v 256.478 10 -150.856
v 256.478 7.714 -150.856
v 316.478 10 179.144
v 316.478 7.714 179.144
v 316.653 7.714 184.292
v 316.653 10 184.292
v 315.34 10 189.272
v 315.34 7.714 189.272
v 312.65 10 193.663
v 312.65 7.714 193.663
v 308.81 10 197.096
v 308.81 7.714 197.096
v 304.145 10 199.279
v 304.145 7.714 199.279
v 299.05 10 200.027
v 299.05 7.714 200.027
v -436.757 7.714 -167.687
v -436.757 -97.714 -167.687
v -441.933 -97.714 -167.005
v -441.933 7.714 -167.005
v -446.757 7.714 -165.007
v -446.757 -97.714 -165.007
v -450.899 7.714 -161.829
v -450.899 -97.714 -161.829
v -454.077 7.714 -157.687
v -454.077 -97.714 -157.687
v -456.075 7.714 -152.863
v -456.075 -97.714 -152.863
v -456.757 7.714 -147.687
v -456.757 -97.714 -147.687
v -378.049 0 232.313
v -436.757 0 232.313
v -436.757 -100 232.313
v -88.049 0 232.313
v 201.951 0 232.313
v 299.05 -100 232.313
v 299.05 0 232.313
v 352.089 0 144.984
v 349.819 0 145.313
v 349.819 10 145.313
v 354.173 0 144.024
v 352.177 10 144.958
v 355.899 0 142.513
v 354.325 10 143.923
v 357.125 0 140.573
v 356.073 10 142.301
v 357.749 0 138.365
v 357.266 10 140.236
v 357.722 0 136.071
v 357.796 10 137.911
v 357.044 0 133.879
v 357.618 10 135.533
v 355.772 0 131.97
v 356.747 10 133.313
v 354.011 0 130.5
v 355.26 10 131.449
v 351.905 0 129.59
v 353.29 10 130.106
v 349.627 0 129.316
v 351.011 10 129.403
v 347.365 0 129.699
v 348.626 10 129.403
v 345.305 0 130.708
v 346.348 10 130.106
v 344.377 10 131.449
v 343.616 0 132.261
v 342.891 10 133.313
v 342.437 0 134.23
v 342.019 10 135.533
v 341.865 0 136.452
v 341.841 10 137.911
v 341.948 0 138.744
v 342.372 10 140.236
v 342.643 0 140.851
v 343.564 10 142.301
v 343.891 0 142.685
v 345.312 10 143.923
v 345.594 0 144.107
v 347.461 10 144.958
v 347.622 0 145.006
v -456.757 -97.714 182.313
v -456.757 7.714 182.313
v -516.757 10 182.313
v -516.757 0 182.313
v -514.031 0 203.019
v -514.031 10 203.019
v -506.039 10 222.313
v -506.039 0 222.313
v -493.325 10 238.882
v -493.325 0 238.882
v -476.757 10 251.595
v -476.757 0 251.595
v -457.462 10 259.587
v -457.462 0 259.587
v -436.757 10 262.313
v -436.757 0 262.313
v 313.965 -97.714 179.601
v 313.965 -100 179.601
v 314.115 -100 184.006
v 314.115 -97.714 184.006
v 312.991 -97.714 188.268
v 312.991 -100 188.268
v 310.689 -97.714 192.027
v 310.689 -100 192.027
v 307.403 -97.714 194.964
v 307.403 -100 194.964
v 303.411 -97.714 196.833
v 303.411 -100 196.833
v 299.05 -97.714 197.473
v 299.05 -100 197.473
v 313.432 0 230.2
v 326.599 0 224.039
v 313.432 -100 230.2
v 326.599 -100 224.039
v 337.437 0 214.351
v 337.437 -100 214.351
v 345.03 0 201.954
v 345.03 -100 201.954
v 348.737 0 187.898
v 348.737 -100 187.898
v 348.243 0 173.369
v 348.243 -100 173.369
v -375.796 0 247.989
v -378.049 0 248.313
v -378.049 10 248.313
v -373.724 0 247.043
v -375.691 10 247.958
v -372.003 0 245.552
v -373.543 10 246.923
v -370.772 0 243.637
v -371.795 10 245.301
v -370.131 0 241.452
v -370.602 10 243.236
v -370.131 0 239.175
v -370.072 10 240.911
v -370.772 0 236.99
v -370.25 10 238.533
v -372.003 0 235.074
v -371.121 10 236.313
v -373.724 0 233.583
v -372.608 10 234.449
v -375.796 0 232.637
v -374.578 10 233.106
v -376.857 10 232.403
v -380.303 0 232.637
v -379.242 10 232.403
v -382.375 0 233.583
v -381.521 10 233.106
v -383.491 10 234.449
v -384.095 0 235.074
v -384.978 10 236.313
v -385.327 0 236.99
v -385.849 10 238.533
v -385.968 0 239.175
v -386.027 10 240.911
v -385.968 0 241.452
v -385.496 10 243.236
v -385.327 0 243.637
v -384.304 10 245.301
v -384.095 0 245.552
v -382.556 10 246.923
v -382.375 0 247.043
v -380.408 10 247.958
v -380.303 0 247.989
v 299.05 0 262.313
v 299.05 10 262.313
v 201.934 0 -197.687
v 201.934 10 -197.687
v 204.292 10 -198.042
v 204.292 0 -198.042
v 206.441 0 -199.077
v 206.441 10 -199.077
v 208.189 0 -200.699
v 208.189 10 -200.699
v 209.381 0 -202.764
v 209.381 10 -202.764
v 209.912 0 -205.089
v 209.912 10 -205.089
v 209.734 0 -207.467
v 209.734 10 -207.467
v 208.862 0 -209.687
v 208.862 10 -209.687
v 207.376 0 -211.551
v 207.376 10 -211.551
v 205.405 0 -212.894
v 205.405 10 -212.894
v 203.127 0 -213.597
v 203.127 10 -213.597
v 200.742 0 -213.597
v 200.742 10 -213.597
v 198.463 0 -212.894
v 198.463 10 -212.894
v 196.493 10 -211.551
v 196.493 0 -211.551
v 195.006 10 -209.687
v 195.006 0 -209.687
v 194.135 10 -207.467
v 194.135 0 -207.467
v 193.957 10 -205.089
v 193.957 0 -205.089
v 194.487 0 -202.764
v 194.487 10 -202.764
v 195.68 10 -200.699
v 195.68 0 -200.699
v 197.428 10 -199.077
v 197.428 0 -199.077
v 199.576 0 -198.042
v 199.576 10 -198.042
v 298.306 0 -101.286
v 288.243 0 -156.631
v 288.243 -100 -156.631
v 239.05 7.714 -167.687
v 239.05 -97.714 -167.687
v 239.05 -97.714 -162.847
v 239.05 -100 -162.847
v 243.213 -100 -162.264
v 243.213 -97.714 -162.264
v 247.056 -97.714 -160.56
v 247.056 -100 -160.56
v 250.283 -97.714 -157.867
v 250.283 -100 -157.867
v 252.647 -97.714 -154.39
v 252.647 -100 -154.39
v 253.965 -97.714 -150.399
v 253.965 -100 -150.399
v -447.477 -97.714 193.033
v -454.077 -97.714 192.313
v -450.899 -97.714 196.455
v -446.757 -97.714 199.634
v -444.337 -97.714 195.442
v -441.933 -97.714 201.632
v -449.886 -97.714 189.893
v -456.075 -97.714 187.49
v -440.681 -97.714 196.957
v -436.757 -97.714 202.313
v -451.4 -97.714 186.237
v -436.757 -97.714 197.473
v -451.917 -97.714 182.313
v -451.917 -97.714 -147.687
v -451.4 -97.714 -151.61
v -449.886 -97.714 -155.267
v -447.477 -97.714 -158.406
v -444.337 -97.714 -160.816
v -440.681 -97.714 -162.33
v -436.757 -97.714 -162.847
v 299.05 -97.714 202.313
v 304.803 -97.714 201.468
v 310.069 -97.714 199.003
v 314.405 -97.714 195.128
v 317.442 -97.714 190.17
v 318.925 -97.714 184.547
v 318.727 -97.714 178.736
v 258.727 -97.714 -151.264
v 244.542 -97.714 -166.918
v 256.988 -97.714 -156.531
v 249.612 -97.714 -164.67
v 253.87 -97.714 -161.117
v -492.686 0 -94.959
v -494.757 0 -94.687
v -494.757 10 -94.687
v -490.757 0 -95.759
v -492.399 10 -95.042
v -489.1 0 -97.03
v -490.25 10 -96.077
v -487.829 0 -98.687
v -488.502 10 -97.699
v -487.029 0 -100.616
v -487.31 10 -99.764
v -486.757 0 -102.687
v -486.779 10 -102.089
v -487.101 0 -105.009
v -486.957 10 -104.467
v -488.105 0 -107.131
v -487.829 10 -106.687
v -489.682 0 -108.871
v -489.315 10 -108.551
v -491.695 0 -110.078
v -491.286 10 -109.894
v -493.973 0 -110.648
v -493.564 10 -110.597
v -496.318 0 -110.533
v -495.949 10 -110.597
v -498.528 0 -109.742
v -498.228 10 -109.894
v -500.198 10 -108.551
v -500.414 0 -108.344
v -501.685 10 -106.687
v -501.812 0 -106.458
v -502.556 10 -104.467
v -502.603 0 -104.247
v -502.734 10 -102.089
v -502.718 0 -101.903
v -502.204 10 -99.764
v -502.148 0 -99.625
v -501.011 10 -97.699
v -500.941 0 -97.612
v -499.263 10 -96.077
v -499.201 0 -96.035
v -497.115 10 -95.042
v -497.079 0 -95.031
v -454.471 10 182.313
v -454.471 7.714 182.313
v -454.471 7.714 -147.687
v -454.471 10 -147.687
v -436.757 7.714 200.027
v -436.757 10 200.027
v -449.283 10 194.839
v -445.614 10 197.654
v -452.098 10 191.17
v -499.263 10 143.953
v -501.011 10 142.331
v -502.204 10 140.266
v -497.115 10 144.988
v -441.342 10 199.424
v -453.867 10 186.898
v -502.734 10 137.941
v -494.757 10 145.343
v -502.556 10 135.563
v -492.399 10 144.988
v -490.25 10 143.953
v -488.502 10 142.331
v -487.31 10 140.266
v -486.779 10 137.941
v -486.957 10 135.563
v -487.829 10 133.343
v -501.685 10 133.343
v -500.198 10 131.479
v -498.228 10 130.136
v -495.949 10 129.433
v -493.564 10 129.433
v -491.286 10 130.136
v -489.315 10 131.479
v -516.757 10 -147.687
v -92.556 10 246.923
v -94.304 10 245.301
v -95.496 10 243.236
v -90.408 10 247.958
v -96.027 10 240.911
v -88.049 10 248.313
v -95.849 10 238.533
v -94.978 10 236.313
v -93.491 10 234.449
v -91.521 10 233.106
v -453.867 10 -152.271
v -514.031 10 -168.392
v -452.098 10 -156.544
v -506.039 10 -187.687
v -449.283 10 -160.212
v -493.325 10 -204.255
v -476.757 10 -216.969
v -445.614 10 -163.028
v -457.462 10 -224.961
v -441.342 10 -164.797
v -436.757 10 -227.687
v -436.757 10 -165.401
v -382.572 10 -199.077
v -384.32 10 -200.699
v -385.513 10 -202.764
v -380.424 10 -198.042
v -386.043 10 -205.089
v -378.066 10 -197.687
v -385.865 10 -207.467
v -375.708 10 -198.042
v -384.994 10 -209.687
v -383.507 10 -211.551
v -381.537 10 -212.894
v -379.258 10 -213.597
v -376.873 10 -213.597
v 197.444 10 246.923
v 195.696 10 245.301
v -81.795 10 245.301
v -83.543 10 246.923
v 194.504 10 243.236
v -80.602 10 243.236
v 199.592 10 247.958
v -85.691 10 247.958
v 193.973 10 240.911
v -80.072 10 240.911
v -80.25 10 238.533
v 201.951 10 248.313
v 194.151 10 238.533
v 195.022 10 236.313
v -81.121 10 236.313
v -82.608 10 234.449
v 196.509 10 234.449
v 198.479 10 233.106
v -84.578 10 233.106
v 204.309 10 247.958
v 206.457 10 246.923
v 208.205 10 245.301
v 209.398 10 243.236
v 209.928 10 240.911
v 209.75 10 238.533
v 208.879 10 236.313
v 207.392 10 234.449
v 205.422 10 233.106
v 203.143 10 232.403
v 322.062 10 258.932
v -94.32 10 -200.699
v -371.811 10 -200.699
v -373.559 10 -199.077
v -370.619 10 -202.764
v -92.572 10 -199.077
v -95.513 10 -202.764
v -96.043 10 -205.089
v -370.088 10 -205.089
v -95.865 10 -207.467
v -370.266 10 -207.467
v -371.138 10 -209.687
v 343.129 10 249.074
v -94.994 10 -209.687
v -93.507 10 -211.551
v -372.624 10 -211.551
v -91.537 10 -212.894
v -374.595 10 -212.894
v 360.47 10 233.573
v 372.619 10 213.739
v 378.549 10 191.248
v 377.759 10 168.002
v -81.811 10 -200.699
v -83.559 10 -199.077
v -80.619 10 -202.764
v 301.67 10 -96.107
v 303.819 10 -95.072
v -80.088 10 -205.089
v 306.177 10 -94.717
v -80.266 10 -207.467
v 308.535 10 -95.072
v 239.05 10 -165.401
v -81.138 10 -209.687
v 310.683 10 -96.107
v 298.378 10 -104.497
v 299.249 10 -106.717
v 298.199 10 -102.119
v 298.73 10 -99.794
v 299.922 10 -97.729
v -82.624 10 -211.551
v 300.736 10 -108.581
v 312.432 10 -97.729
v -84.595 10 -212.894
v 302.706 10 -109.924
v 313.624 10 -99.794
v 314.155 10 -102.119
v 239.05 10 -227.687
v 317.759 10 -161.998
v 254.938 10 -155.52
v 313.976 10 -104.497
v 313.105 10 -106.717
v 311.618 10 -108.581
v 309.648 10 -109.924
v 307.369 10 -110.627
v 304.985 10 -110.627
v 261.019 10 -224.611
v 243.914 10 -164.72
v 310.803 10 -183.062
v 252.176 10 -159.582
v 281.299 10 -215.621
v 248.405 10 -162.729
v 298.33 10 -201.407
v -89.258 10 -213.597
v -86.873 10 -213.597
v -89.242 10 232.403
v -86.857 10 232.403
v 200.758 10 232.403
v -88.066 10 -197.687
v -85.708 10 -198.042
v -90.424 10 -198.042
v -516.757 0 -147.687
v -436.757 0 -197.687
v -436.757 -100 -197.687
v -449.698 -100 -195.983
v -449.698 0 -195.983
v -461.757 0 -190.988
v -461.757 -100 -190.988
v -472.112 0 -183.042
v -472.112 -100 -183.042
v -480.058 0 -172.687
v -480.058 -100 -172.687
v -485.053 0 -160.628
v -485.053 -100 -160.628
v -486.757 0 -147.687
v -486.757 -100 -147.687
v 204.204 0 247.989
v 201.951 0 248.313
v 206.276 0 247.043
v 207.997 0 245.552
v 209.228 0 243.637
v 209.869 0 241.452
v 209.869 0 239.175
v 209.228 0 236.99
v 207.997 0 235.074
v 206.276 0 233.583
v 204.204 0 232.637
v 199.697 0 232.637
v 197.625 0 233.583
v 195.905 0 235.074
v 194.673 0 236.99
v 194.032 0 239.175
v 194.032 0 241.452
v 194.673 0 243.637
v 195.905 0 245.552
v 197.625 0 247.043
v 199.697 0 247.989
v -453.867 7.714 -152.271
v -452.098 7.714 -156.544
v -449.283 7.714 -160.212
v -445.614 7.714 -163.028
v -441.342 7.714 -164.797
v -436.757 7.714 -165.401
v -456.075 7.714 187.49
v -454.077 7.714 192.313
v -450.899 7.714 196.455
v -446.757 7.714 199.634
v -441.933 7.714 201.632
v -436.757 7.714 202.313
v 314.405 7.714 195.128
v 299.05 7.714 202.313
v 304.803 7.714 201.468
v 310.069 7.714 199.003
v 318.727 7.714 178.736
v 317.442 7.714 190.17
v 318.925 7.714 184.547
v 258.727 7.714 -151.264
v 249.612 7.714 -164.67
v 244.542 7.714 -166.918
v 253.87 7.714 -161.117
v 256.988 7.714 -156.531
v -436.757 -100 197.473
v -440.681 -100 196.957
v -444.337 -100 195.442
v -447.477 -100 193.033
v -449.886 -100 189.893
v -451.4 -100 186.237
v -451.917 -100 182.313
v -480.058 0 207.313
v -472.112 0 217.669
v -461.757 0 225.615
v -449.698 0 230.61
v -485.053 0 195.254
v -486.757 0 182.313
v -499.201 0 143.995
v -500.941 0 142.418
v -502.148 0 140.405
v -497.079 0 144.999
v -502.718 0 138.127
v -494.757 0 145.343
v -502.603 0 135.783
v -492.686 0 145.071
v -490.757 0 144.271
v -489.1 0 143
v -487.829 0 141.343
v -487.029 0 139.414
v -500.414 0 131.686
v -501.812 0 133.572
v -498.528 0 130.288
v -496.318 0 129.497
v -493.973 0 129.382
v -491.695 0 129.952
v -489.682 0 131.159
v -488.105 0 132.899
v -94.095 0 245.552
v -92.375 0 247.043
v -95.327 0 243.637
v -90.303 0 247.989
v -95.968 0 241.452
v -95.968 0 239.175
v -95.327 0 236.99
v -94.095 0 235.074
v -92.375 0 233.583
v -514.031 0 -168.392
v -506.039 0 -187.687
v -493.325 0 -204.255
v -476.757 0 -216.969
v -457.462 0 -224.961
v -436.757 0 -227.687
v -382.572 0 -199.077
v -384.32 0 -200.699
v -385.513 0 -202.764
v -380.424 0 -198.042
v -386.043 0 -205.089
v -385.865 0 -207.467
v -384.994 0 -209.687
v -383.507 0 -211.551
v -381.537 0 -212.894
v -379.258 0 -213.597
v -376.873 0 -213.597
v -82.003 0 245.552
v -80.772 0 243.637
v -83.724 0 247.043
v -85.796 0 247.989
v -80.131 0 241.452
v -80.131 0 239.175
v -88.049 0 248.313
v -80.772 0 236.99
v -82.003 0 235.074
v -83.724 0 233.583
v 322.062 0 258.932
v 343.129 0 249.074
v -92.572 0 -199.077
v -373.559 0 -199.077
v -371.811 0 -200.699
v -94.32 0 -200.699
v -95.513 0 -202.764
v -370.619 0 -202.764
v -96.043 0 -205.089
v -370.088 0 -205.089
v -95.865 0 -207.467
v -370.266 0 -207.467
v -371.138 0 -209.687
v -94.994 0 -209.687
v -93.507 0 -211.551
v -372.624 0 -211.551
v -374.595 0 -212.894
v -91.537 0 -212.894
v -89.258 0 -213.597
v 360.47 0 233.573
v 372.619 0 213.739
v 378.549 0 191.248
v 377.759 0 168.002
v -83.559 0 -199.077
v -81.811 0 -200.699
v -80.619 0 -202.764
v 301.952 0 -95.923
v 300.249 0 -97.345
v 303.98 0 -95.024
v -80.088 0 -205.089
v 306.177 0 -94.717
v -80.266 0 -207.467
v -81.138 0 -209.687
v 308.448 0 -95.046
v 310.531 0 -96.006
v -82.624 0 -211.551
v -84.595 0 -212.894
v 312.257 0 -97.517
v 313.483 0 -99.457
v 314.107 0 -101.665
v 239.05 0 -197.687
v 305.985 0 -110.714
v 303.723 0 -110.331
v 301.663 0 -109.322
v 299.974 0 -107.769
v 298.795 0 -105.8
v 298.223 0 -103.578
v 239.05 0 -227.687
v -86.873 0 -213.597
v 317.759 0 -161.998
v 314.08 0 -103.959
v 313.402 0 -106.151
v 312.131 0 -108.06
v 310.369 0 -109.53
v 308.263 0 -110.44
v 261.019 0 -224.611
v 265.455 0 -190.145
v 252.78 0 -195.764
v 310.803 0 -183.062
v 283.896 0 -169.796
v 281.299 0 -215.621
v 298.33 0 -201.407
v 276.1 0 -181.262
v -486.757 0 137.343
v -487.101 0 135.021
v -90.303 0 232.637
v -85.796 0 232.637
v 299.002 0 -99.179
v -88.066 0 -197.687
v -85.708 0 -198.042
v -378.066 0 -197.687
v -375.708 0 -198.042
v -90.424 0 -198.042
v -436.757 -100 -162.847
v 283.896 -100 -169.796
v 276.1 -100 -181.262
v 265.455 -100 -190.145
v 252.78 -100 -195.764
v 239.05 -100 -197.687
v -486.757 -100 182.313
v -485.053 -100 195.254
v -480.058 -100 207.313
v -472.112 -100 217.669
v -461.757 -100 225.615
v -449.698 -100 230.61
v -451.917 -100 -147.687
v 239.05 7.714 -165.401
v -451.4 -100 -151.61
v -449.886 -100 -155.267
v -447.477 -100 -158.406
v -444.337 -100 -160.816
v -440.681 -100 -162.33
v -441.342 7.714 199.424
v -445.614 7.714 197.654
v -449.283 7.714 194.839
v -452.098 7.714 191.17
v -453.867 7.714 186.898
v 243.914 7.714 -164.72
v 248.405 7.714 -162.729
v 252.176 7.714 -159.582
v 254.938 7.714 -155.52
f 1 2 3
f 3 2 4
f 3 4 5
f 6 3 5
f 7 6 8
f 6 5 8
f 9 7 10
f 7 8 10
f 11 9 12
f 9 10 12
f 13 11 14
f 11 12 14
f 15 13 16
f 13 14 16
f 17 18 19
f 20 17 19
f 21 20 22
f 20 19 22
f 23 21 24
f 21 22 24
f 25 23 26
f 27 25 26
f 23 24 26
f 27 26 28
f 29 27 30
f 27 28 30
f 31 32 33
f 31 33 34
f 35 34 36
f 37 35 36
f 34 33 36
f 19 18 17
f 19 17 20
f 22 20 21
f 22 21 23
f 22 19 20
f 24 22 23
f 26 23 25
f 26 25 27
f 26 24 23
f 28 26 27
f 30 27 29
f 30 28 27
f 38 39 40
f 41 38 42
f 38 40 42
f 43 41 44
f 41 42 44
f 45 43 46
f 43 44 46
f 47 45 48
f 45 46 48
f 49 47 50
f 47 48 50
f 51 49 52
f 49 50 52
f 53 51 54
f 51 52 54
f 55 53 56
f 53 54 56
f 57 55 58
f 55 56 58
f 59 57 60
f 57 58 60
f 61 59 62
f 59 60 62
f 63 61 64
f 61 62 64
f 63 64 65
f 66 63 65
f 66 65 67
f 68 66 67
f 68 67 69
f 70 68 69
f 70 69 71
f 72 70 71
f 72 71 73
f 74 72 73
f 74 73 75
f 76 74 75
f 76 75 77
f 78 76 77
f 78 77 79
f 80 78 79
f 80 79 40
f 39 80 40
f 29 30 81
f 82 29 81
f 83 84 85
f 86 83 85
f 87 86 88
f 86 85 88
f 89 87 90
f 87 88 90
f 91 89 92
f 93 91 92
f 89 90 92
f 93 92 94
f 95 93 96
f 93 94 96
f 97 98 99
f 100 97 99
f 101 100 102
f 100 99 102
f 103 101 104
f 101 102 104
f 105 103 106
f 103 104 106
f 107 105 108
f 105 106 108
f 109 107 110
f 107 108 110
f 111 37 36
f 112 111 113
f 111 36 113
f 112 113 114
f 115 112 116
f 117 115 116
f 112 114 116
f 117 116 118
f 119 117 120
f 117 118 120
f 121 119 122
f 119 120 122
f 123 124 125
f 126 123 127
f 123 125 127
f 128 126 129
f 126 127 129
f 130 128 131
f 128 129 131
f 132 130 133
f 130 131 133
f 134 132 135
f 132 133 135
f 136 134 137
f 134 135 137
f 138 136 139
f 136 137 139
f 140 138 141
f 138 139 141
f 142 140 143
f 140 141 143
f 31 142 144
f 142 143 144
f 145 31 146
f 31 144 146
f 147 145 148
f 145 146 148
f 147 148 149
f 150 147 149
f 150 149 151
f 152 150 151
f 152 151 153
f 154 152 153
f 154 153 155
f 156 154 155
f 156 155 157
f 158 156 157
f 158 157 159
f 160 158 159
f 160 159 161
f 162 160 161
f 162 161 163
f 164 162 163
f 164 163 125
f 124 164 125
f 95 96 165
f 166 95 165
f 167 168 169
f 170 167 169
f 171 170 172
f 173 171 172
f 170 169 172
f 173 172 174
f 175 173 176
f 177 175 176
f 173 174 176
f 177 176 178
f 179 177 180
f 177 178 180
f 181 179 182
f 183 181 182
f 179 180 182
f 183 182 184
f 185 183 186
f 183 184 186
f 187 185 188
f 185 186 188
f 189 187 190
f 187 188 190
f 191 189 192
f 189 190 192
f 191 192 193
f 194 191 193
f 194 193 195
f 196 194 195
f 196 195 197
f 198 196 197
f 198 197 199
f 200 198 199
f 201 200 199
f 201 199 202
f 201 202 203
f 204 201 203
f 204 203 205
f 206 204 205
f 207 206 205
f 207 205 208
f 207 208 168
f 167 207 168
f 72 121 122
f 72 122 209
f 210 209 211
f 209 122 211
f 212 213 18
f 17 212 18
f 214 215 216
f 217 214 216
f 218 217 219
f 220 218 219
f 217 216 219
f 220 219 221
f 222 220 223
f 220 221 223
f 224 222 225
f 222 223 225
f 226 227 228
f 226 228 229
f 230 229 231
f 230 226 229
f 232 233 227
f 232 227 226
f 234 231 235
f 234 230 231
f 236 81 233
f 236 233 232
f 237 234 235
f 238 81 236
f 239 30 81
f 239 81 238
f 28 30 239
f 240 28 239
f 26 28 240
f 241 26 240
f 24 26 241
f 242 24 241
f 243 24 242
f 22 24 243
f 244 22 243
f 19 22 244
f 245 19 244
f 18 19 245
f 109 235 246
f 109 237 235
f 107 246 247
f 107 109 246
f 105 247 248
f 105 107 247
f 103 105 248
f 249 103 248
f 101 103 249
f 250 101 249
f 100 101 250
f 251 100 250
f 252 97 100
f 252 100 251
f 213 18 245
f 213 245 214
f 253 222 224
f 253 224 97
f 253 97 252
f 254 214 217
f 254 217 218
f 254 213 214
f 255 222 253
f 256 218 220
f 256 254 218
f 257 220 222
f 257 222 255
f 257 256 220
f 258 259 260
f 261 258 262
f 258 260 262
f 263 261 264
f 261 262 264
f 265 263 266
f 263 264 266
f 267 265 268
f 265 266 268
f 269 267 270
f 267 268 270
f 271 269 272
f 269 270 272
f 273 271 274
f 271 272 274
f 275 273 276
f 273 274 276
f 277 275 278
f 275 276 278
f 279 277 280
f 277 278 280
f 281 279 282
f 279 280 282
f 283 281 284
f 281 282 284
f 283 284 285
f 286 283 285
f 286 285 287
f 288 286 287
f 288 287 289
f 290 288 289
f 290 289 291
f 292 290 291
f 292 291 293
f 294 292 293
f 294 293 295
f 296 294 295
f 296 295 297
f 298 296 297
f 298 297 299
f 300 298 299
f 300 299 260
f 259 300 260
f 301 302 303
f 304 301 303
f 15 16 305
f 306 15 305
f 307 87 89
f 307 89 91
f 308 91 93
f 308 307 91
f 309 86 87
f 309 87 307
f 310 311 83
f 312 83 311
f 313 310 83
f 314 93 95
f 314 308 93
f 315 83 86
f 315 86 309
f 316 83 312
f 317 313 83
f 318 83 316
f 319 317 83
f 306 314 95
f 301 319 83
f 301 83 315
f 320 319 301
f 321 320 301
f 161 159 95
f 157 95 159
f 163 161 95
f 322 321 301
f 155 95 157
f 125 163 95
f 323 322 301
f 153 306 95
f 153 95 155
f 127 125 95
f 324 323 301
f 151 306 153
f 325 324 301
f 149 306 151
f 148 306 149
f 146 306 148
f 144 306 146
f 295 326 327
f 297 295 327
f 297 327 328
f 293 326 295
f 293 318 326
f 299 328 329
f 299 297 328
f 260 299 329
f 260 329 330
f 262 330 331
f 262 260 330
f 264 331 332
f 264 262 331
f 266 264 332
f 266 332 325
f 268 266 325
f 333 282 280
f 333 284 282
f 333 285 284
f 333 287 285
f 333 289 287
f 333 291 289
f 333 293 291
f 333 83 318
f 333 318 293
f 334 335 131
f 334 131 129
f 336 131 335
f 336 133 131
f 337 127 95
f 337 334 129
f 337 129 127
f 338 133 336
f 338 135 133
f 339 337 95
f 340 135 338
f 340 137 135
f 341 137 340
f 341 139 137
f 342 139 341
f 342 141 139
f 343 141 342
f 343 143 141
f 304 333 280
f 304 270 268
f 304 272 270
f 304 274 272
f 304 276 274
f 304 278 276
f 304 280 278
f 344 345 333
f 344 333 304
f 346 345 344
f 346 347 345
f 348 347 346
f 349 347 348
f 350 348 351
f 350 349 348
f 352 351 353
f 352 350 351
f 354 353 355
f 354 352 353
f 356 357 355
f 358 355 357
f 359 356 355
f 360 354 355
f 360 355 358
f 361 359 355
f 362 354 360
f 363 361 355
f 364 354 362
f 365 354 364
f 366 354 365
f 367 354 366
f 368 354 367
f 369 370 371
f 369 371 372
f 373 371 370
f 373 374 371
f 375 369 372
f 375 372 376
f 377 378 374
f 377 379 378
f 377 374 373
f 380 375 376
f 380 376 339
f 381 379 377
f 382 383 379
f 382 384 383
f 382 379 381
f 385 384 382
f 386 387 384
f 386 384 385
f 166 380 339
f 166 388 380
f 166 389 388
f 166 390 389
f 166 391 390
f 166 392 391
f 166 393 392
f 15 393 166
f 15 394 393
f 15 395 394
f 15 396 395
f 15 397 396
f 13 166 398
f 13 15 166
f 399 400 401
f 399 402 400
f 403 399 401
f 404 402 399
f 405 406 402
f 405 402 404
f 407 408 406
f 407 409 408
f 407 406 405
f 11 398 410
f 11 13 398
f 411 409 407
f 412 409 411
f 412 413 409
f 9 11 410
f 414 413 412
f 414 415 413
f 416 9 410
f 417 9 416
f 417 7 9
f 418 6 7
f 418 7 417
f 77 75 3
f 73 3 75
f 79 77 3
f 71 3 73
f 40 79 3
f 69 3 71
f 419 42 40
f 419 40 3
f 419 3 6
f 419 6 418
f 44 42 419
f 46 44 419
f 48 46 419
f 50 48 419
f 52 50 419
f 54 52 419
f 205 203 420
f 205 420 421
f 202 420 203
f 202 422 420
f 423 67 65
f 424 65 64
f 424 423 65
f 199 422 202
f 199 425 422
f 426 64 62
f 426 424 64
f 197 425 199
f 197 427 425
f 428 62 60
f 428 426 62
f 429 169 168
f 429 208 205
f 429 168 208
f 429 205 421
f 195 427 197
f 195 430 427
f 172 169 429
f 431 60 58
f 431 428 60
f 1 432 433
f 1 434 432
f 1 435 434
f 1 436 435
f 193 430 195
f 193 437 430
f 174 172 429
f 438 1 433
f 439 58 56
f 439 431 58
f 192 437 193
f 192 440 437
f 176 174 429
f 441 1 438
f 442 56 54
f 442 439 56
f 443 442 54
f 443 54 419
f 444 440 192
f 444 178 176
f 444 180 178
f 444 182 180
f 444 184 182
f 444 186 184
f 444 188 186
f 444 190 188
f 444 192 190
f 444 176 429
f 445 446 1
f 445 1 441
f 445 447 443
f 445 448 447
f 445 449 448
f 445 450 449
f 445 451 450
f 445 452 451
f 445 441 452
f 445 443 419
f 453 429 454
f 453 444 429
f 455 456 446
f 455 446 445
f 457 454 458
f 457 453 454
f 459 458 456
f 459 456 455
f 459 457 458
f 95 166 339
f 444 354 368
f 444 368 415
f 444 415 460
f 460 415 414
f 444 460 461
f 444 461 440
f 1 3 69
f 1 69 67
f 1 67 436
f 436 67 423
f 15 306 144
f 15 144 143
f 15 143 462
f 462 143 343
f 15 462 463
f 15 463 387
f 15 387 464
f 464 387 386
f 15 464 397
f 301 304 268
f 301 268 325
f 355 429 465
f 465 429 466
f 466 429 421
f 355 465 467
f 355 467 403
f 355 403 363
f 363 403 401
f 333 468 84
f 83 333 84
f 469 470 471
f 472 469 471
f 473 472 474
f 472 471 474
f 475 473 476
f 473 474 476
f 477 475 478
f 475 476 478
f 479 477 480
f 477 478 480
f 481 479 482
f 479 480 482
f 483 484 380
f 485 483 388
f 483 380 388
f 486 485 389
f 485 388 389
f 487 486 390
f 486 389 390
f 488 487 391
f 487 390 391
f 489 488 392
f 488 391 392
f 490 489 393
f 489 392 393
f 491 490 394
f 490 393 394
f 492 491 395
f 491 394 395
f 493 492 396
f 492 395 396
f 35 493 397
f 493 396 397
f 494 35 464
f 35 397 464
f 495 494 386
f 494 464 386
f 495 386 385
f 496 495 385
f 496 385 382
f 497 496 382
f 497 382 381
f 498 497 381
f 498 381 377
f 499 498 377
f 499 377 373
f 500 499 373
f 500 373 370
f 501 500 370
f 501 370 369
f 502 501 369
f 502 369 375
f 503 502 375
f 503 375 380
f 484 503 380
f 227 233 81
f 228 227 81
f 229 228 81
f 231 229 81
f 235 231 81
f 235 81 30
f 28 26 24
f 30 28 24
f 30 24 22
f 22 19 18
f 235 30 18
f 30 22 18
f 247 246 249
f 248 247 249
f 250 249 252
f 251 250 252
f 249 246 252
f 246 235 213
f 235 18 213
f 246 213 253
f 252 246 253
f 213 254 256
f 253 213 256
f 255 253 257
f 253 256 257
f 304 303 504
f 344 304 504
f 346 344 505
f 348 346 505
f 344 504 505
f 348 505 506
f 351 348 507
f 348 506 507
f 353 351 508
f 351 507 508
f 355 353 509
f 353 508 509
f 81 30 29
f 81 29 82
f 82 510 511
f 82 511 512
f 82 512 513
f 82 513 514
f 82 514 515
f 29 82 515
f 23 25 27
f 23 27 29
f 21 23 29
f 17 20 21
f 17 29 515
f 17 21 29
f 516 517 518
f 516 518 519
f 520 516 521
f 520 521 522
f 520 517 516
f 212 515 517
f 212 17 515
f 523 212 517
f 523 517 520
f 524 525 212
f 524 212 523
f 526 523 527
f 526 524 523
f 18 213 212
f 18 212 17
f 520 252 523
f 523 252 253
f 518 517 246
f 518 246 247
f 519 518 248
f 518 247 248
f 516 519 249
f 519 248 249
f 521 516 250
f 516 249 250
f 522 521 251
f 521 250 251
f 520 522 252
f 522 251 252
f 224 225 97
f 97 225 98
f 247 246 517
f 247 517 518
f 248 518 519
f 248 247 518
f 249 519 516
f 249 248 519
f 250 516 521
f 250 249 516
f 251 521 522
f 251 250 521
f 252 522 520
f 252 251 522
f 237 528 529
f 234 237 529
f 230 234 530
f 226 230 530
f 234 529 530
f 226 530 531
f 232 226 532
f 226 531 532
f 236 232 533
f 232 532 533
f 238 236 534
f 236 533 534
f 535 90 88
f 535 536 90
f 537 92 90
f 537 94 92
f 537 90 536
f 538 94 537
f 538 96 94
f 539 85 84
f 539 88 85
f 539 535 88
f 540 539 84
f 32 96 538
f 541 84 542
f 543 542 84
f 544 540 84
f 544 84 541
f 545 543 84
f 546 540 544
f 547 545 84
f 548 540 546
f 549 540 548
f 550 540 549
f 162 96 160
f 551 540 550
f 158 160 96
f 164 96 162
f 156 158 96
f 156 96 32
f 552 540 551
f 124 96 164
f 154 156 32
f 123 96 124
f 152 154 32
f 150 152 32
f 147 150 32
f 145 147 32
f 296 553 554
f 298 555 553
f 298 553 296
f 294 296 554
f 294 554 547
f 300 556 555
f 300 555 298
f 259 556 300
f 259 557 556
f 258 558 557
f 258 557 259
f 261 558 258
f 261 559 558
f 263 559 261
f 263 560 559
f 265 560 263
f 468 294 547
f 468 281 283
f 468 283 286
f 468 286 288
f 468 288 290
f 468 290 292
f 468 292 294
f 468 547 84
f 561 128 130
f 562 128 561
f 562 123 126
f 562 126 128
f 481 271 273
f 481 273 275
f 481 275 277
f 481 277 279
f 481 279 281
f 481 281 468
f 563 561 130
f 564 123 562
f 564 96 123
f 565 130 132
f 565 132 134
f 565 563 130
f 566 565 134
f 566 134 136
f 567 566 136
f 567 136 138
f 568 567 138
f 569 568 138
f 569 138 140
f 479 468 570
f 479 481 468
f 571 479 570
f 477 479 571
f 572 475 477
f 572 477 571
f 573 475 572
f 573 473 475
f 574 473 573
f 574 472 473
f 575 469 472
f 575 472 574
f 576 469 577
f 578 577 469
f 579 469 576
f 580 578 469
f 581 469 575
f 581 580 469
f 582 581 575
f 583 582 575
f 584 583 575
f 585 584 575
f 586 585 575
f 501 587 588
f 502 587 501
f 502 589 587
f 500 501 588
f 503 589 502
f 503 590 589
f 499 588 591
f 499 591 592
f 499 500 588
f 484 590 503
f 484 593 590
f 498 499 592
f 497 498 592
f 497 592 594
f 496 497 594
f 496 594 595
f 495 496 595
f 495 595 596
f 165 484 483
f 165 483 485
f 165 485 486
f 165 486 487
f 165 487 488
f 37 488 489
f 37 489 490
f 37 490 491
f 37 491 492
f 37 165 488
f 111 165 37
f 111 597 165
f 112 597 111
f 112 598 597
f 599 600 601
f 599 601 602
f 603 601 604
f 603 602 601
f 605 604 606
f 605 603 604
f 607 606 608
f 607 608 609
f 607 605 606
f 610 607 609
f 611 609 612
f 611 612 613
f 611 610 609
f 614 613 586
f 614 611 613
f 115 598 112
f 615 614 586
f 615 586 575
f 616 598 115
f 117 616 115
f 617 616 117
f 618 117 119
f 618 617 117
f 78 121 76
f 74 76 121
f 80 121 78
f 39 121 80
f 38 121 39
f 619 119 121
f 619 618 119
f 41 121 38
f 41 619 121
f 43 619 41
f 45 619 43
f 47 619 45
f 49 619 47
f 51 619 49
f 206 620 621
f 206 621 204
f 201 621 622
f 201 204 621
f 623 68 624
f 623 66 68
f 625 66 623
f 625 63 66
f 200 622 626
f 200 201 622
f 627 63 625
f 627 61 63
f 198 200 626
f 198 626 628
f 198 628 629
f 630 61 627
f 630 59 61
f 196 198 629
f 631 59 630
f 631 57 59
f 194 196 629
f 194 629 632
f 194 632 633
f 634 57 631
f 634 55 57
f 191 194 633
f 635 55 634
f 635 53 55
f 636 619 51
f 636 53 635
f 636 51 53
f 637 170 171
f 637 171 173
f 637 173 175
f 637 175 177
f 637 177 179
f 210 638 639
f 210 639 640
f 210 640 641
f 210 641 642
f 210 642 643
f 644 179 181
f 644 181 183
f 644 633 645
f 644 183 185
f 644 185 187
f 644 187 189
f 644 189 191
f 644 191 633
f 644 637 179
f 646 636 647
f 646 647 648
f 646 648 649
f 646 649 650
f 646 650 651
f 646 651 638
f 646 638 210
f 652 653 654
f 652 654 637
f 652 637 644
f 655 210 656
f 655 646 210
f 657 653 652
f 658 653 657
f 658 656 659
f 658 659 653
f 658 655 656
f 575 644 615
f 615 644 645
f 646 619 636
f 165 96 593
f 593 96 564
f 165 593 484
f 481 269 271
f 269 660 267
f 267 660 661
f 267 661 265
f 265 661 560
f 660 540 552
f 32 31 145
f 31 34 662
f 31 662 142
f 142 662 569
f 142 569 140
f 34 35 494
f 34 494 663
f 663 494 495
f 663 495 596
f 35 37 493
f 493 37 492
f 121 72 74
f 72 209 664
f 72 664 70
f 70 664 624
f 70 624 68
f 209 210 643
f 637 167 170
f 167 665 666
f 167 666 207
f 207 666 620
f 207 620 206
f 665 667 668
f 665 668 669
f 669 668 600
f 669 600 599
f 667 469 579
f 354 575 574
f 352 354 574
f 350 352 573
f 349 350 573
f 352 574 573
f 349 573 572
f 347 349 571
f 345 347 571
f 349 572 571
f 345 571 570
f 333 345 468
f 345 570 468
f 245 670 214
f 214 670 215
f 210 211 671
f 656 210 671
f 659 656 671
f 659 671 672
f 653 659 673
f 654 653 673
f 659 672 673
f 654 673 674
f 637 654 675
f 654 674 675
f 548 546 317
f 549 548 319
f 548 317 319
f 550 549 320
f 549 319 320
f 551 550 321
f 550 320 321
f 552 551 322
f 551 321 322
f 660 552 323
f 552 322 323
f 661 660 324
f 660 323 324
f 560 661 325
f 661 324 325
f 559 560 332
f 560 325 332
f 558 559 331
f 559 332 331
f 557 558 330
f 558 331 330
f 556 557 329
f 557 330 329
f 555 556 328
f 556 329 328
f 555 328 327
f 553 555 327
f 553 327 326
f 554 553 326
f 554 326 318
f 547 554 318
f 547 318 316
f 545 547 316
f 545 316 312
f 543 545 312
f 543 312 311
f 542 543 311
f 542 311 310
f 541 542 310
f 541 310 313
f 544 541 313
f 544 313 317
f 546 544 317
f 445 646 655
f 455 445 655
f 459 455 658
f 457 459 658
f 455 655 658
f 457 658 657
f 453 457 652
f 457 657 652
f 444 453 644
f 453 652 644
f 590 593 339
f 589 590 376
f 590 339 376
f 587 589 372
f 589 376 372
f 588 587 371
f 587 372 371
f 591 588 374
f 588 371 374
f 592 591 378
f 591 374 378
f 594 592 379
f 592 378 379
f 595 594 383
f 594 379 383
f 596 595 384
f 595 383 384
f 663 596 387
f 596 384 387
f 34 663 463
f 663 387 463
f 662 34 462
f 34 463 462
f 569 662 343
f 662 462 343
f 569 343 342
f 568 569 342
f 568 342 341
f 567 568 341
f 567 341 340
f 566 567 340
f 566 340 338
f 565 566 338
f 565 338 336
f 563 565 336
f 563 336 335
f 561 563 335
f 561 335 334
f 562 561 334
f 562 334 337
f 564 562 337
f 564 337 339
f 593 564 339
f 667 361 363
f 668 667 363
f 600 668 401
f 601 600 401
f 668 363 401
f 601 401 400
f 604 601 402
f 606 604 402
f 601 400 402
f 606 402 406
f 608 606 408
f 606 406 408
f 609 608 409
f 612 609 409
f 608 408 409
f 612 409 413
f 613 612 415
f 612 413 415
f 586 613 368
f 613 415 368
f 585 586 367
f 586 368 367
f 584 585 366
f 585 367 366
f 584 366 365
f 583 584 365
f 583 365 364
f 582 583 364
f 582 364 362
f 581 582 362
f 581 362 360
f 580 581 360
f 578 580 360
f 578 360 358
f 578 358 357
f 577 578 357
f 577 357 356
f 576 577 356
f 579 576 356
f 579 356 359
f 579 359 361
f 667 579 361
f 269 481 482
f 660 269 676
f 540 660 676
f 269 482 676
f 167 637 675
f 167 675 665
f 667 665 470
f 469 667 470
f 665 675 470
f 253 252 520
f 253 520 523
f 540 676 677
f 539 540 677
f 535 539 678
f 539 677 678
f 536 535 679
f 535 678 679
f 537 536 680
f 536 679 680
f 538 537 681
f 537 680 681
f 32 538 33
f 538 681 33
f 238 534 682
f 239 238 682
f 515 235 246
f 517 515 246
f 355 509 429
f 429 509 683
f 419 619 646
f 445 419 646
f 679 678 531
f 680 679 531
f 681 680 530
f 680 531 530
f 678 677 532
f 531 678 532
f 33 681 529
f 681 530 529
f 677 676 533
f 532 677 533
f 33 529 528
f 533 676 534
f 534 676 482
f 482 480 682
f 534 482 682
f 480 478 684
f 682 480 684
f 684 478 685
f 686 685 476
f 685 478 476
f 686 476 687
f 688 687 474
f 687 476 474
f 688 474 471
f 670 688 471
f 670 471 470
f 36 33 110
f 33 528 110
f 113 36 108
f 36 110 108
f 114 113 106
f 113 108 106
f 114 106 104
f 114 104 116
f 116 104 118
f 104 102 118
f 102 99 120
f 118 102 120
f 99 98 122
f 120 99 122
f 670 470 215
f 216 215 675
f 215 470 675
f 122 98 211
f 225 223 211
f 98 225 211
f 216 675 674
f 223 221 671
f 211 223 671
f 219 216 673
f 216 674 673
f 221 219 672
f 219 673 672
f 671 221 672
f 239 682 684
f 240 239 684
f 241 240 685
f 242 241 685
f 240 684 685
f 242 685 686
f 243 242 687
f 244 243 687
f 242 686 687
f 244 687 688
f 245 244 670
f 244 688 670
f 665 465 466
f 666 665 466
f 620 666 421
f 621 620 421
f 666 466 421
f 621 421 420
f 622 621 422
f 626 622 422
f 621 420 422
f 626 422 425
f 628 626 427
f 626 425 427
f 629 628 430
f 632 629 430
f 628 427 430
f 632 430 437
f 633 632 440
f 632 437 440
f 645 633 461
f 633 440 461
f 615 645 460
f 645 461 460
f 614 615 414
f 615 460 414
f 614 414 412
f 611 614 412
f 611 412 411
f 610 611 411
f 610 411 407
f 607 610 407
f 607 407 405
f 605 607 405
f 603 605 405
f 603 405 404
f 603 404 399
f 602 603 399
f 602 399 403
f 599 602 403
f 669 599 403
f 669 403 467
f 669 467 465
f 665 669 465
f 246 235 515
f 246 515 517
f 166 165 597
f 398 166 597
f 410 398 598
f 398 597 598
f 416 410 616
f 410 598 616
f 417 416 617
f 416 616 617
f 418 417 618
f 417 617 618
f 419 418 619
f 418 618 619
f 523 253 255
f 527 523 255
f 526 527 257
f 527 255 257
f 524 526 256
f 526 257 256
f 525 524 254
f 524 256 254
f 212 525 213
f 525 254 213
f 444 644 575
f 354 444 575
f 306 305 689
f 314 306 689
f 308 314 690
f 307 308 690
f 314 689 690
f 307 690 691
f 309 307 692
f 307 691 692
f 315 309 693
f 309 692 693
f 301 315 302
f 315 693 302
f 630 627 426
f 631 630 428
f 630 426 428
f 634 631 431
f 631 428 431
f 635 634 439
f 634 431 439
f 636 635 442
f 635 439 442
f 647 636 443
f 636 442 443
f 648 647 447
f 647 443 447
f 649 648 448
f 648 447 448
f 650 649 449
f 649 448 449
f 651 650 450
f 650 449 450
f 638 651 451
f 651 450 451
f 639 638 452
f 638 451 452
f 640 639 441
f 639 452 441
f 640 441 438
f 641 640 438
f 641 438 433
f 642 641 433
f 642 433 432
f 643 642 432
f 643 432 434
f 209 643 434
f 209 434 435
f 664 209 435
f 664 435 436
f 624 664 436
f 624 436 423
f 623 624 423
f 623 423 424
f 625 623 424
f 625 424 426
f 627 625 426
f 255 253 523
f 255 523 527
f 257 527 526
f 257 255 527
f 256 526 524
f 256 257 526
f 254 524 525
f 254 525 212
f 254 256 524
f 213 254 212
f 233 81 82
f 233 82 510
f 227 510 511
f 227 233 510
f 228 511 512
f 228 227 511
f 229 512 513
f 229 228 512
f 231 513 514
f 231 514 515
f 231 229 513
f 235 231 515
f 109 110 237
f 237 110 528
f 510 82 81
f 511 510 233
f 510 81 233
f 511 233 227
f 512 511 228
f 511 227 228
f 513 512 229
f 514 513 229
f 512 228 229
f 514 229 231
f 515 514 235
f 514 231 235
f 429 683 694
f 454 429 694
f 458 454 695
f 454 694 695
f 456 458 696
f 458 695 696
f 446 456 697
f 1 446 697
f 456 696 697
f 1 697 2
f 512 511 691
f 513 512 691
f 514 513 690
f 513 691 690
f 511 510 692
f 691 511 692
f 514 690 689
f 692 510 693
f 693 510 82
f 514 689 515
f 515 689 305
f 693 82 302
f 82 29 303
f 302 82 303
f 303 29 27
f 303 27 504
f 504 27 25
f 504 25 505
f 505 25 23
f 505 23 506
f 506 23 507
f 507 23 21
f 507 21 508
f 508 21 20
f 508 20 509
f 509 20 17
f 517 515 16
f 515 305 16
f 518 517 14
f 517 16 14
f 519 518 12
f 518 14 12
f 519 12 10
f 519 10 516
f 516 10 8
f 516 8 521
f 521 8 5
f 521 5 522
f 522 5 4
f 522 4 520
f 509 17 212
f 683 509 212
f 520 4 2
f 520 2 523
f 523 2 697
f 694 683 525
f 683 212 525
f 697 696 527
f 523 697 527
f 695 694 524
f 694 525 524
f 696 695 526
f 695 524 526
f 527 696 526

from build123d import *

# Parameters (mm, degrees)
SURFACE_EXTRUDE1_1_BACK  = 100
SURFACE_EXTRUDE1_1_DEPTH = 100
THICKEN1_T1              = 30
SURFACE_EXTRUDE2_2_DEPTH = 10
THICKEN2_T1              = 30
THICKEN2_T2              = 30
SKETCH3_R                = 8
CUT_EXTRUDE1_DEPTH       = 185.166
THICKEN3_START           = -100
THICKEN3_DEPTH           = 2.286
THICKEN4_START           = 7.714
THICKEN4_DEPTH           = 2.286
THICKEN8_START           = -97.714
THICKEN8_DEPTH           = 105.427999964


# Read off the part's stored shape, not the designer's step: Thicken3, Thicken4, Thicken8
with BuildPart() as body_1:
    # Surface-Extrude1: a surface, the sketch's curves swept straight by 100 mm
    with BuildLine(Plane(origin=(0, 0, 0), x_dir=(1, 0, 0), z_dir=(0, 1, 0)).offset(-SURFACE_EXTRUDE1_1_BACK), mode=Mode.PRIVATE) as surface_extrude1_1_path:
        Line((-486.756814761, 147.686739346), (-486.756814761, -182.313260654))
        ThreePointArc((-486.756814761, -182.313260654), (-472.112153821, -217.668599714), (-436.756814761, -232.313260654))
        Line((-436.756814761, -232.313260654), (299.049689734, -232.313260654))
        ThreePointArc((299.049689734, -232.313260654), (337.43727624, -214.350632617), (348.243185239, -173.368988744))
        Line((348.243185239, -173.368988744), (288.243185239, 156.631011256))
        ThreePointArc((288.243185239, 156.631011256), (271.087061696, 186.074325852), (239.049689734, 197.686739346))
        Line((239.049689734, 197.686739346), (-436.756814761, 197.686739346))
        ThreePointArc((-436.756814761, 197.686739346), (-472.112153821, 183.042078405), (-486.756814761, 147.686739346))
    surface_extrude1_1 = Shell.extrude(surface_extrude1_1_path.wire(), (0 * SURFACE_EXTRUDE1_1_DEPTH, 1 * SURFACE_EXTRUDE1_1_DEPTH, 0 * SURFACE_EXTRUDE1_1_DEPTH))
    add(Solid.thicken(surface_extrude1_1, THICKEN1_T1))

    # Surface-Extrude2: a surface, the sketch's curves swept straight by 10 mm
    with BuildLine(Plane(origin=(0, 0, 0), x_dir=(1, 0, 0), z_dir=(0, 1, 0)), mode=Mode.PRIVATE) as surface_extrude2_2_path:
        Line((-486.756814761, 147.686739346), (-486.756814761, -182.313260654))
        ThreePointArc((-486.756814761, -182.313260654), (-472.112153821, -217.668599714), (-436.756814761, -232.313260654))
        Line((-436.756814761, -232.313260654), (299.049689734, -232.313260654))
        ThreePointArc((299.049689734, -232.313260654), (337.43727624, -214.350632617), (348.243185239, -173.368988744))
        Line((348.243185239, -173.368988744), (288.243185239, 156.631011256))
        ThreePointArc((288.243185239, 156.631011256), (271.087061696, 186.074325852), (239.049689734, 197.686739346))
        Line((239.049689734, 197.686739346), (-436.756814761, 197.686739346))
        ThreePointArc((-436.756814761, 197.686739346), (-472.112153821, 183.042078405), (-486.756814761, 147.686739346))
    surface_extrude2_2 = Shell.extrude(surface_extrude2_2_path.wire(), (0 * SURFACE_EXTRUDE2_2_DEPTH, 1 * SURFACE_EXTRUDE2_2_DEPTH, 0 * SURFACE_EXTRUDE2_2_DEPTH))
    add(Solid.thicken(surface_extrude2_2, THICKEN2_T1))
    add(Solid.thicken(surface_extrude2_2, -THICKEN2_T2))

    # Sketch3 → Cut-Extrude1 (cut)
    with BuildSketch(Plane(origin=(0, 10, 0), x_dir=(1, 0, 0), z_dir=(0, 1, 0))):
        with Locations(Location((-378.065726857, 205.686739346, 0), (0, 0, 270))):
            Circle(SKETCH3_R)
        with Locations(Location((-88.065726857, 205.686739346, 0), (0, 0, 270))):
            Circle(SKETCH3_R)
        with Locations(Location((201.934273143, 205.686739346, 0), (0, 0, 270))):
            Circle(SKETCH3_R)
        with Locations(Location((-494.756814761, 102.686739346, 0), (0, 0, 270))):
            Circle(SKETCH3_R)
        with Locations(Location((-494.756814761, -137.343260654, 0), (0, 0, 270))):
            Circle(SKETCH3_R)
        with Locations(Location((-378.049461671, -240.313260654, 0), (0, 0, 270))):
            Circle(SKETCH3_R)
        with Locations(Location((-88.049461789, -240.313260654, 0), (0, 0, 270))):
            Circle(SKETCH3_R)
        with Locations(Location((201.950538093, -240.313260654, 0), (0, 0, 270))):
            Circle(SKETCH3_R)
        with Locations(Location((306.176936413, 102.716739346, 0), (0, 0, 270))):
            Circle(SKETCH3_R)
        with Locations(Location((349.818754595, -137.313260654, 0), (0, 0, 270))):
            Circle(SKETCH3_R)
    extrude(amount=-CUT_EXTRUDE1_DEPTH, mode=Mode.SUBTRACT)

    # Thicken3 outline → Thicken3 (add)
    with BuildSketch(Plane(origin=(0, 0, 0), x_dir=(1, 0, 0), z_dir=(0, 1, 0)).offset(THICKEN3_START)):
        with BuildLine():
            ThreePointArc((299.049689734, -202.313260654), (314.404724336, -195.128209439), (318.727087936, -178.73555189))
            Line((318.727087936, -178.73555189), (258.727087936, 151.26444811))
            ThreePointArc((258.727087936, 151.26444811), (251.864638519, 163.041773948), (239.049689734, 167.686739346))
            Line((239.049689734, 167.686739346), (-436.756814761, 167.686739346))
            ThreePointArc((-436.756814761, 167.686739346), (-450.898950384, 161.828874969), (-456.756814761, 147.686739346))
            Line((-456.756814761, 147.686739346), (-456.756814761, -182.313260654))
            ThreePointArc((-456.756814761, -182.313260654), (-450.898950385, -196.455396278), (-436.756814761, -202.313260654))
            Line((-436.756814761, -202.313260654), (299.049689734, -202.313260654))
        make_face()
        with BuildLine():
            ThreePointArc((239.049689734, 162.846739374), (248.763420931, 159.325855596), (253.965157598, 150.398642594))
            Line((253.965157598, 150.398642594), (313.965157598, -179.601357406))
            ThreePointArc((313.965157598, -179.601357406), (310.688805984, -192.026991851), (299.049689734, -197.473260682))
            Line((299.049689734, -197.473260682), (-436.756814761, -197.473260682))
            ThreePointArc((-436.756814761, -197.473260682), (-447.476553584, -193.032999477), (-451.916814789, -182.313260654))
            Line((-451.916814789, -182.313260654), (-451.916814789, 147.686739346))
            ThreePointArc((-451.916814789, 147.686739346), (-447.476553583, 158.406478169), (-436.756814761, 162.846739374))
            Line((-436.756814761, 162.846739374), (239.049689734, 162.846739374))
        make_face(mode=Mode.SUBTRACT)
    extrude(amount=THICKEN3_DEPTH)

    # Thicken4 outline → Thicken4 (add)
    with BuildSketch(Plane(origin=(0, 0, 0), x_dir=(1, 0, 0), z_dir=(0, 1, 0)).offset(THICKEN4_START)):
        with BuildLine():
            ThreePointArc((299.049689734, -202.313260654), (314.404724336, -195.128209439), (318.727087936, -178.73555189))
            Line((318.727087936, -178.73555189), (258.727087936, 151.26444811))
            ThreePointArc((258.727087936, 151.26444811), (251.864638519, 163.041773948), (239.049689734, 167.686739346))
            Line((239.049689734, 167.686739346), (-436.756814761, 167.686739346))
            ThreePointArc((-436.756814761, 167.686739346), (-450.898950384, 161.828874969), (-456.756814761, 147.686739346))
            Line((-456.756814761, 147.686739346), (-456.756814761, -182.313260654))
            ThreePointArc((-456.756814761, -182.313260654), (-450.898950385, -196.455396278), (-436.756814761, -202.313260654))
            Line((-436.756814761, -202.313260654), (299.049689734, -202.313260654))
        make_face()
        with BuildLine():
            Line((256.477961321, 150.855515998), (316.477961321, -179.144484002))
            ThreePointArc((316.477961321, -179.144484002), (312.649643881, -193.663460793), (299.049689734, -200.027260654))
            Line((299.049689734, -200.027260654), (-436.756814761, -200.027260654))
            ThreePointArc((-436.756814761, -200.027260654), (-449.282504283, -194.838950176), (-454.470814761, -182.313260654))
            Line((-454.470814761, -182.313260654), (-454.470814761, 147.686739346))
            ThreePointArc((-454.470814761, 147.686739346), (-449.282504283, 160.212428868), (-436.756814761, 165.400739346))
            Line((-436.756814761, 165.400739346), (239.049689734, 165.400739346))
            ThreePointArc((239.049689734, 165.400739346), (250.399889873, 161.286693493), (256.477961321, 150.855515998))
        make_face(mode=Mode.SUBTRACT)
    extrude(amount=THICKEN4_DEPTH)


with BuildPart() as body_2:
    # Thicken8 outline → Thicken8 (new body)
    with BuildSketch(Plane(origin=(0, 0, 0), x_dir=(1, 0, 0), z_dir=(0, 1, 0)).offset(THICKEN8_START)):
        with BuildLine():
            ThreePointArc((-436.756814761, 167.686739346), (-450.898950384, 161.828874969), (-456.756814761, 147.686739346))
            Line((-456.756814761, 147.686739346), (-456.756814761, -182.313260654))
            ThreePointArc((-456.756814761, -182.313260654), (-450.898950385, -196.455396278), (-436.756814761, -202.313260654))
            Line((-436.756814761, -202.313260654), (299.049689734, -202.313260654))
            ThreePointArc((299.049689734, -202.313260654), (314.404724336, -195.128209439), (318.727087936, -178.73555189))
            Line((318.727087936, -178.73555189), (258.727087936, 151.26444811))
            ThreePointArc((258.727087936, 151.26444811), (251.864638519, 163.041773948), (239.049689734, 167.686739346))
            Line((239.049689734, 167.686739346), (-436.756814761, 167.686739346))
        make_face()
    extrude(amount=THICKEN8_DEPTH)


solid = Compound([body_1.part, body_2.part])
